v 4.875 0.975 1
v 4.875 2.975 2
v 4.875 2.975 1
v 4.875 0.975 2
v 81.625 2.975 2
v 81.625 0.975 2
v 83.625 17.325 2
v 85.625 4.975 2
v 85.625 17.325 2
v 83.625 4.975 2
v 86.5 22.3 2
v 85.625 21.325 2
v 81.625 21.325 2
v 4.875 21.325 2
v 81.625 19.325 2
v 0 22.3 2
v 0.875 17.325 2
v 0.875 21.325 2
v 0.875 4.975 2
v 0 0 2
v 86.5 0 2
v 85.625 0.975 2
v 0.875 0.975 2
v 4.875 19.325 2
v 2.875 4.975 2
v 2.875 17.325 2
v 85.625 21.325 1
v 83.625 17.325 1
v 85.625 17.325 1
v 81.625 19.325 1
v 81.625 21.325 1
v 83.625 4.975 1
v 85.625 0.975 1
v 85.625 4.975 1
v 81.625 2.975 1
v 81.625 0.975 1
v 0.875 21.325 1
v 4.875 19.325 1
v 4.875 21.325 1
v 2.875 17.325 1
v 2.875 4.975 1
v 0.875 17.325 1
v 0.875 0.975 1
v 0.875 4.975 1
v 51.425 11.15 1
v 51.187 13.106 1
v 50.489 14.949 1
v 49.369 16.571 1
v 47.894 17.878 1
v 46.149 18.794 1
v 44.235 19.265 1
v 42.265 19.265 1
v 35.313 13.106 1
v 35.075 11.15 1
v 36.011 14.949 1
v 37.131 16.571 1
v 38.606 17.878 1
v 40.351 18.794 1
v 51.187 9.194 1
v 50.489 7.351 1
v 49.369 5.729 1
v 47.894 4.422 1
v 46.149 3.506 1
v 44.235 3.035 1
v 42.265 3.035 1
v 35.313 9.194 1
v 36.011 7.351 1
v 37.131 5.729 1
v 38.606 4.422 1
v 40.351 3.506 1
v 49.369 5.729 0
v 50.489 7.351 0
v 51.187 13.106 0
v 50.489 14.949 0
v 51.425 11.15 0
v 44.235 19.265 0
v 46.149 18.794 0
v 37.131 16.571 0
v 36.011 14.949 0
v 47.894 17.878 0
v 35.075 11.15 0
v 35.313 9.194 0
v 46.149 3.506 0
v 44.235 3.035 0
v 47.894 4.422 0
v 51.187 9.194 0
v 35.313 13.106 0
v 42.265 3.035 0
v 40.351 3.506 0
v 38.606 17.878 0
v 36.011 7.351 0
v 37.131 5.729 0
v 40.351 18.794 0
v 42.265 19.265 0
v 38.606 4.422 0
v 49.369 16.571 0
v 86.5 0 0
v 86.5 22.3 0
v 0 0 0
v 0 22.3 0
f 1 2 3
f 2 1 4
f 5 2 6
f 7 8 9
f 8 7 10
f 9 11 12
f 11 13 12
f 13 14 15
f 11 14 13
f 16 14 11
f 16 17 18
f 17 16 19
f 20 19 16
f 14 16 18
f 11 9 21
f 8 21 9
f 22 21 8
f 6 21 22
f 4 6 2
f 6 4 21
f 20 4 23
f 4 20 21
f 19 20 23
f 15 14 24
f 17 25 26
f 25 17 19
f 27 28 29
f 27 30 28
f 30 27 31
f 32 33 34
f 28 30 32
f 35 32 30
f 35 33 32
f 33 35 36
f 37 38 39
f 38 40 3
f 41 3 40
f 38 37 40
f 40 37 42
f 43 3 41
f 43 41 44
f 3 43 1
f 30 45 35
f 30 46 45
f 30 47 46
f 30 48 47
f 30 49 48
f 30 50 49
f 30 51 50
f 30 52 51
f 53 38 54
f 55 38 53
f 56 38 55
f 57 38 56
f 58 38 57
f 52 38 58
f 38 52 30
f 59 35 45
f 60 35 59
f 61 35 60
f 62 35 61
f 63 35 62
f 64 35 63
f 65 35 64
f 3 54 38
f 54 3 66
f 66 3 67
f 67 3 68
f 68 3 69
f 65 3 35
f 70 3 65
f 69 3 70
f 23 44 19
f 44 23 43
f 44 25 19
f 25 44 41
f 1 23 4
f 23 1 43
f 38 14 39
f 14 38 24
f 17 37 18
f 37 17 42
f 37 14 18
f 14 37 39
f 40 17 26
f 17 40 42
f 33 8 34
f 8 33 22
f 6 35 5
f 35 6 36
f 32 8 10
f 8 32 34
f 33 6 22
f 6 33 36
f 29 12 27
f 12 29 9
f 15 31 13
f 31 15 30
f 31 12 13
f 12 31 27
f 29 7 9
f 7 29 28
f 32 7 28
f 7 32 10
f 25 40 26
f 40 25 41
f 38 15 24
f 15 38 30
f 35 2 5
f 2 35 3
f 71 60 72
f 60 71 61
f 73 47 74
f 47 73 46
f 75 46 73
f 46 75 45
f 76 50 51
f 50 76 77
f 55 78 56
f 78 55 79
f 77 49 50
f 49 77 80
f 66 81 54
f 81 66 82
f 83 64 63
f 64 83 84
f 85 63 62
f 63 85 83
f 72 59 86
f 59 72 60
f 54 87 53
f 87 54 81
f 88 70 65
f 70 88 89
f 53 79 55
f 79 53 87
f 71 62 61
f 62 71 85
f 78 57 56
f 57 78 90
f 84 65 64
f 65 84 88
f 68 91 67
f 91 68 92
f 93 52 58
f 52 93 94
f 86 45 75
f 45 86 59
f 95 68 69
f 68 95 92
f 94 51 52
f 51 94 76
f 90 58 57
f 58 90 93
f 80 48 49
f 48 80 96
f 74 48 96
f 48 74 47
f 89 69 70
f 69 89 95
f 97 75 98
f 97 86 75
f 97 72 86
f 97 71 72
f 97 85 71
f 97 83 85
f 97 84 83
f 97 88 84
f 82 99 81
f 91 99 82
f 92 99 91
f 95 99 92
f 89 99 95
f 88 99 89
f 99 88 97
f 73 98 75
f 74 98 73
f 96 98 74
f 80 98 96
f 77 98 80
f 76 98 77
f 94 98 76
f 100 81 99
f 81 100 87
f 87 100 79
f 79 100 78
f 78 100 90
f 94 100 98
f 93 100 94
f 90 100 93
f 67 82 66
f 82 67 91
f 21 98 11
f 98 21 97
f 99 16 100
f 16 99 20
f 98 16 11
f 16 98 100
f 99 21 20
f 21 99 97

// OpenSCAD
plate_size_x = 80.75;
plate_size_y = 16.35;
plate_mold_depth = 1.0;

jig_size_x = 86.5;
jig_size_y = 22.3;
jig_size_z = 2.0;

plate_top_x = (jig_size_x - plate_size_x) / 2;
plate_top_y = (jig_size_y - plate_size_y) / 2;

corner_cut_size = 4;

module single_plate ( x, y, z ) {
    translate ([x,y,z]) {
        cube([
            plate_size_x, 
            plate_size_y, 
            plate_mold_depth
        ]);
    }
    
    for (i = [0:1]) {
        for (j = [0:1]) {
            translate ([
                i * plate_size_x + x - corner_cut_size / 2, 
                j * plate_size_y + y - corner_cut_size / 2, 
                z
            ]) {
                cube([corner_cut_size, corner_cut_size, plate_mold_depth]);
            }
        }
    }
    
    translate ([x + plate_size_x / 2 , y + plate_size_y / 2 ,0]) {
        cylinder(jig_size_z - plate_mold_depth, plate_size_y / 2, plate_size_y / 2);   
    }
}

difference() {
    cube([jig_size_x, jig_size_y, jig_size_z]);
    
    single_plate(plate_top_x, plate_top_y , jig_size_z - plate_mold_depth);
}
